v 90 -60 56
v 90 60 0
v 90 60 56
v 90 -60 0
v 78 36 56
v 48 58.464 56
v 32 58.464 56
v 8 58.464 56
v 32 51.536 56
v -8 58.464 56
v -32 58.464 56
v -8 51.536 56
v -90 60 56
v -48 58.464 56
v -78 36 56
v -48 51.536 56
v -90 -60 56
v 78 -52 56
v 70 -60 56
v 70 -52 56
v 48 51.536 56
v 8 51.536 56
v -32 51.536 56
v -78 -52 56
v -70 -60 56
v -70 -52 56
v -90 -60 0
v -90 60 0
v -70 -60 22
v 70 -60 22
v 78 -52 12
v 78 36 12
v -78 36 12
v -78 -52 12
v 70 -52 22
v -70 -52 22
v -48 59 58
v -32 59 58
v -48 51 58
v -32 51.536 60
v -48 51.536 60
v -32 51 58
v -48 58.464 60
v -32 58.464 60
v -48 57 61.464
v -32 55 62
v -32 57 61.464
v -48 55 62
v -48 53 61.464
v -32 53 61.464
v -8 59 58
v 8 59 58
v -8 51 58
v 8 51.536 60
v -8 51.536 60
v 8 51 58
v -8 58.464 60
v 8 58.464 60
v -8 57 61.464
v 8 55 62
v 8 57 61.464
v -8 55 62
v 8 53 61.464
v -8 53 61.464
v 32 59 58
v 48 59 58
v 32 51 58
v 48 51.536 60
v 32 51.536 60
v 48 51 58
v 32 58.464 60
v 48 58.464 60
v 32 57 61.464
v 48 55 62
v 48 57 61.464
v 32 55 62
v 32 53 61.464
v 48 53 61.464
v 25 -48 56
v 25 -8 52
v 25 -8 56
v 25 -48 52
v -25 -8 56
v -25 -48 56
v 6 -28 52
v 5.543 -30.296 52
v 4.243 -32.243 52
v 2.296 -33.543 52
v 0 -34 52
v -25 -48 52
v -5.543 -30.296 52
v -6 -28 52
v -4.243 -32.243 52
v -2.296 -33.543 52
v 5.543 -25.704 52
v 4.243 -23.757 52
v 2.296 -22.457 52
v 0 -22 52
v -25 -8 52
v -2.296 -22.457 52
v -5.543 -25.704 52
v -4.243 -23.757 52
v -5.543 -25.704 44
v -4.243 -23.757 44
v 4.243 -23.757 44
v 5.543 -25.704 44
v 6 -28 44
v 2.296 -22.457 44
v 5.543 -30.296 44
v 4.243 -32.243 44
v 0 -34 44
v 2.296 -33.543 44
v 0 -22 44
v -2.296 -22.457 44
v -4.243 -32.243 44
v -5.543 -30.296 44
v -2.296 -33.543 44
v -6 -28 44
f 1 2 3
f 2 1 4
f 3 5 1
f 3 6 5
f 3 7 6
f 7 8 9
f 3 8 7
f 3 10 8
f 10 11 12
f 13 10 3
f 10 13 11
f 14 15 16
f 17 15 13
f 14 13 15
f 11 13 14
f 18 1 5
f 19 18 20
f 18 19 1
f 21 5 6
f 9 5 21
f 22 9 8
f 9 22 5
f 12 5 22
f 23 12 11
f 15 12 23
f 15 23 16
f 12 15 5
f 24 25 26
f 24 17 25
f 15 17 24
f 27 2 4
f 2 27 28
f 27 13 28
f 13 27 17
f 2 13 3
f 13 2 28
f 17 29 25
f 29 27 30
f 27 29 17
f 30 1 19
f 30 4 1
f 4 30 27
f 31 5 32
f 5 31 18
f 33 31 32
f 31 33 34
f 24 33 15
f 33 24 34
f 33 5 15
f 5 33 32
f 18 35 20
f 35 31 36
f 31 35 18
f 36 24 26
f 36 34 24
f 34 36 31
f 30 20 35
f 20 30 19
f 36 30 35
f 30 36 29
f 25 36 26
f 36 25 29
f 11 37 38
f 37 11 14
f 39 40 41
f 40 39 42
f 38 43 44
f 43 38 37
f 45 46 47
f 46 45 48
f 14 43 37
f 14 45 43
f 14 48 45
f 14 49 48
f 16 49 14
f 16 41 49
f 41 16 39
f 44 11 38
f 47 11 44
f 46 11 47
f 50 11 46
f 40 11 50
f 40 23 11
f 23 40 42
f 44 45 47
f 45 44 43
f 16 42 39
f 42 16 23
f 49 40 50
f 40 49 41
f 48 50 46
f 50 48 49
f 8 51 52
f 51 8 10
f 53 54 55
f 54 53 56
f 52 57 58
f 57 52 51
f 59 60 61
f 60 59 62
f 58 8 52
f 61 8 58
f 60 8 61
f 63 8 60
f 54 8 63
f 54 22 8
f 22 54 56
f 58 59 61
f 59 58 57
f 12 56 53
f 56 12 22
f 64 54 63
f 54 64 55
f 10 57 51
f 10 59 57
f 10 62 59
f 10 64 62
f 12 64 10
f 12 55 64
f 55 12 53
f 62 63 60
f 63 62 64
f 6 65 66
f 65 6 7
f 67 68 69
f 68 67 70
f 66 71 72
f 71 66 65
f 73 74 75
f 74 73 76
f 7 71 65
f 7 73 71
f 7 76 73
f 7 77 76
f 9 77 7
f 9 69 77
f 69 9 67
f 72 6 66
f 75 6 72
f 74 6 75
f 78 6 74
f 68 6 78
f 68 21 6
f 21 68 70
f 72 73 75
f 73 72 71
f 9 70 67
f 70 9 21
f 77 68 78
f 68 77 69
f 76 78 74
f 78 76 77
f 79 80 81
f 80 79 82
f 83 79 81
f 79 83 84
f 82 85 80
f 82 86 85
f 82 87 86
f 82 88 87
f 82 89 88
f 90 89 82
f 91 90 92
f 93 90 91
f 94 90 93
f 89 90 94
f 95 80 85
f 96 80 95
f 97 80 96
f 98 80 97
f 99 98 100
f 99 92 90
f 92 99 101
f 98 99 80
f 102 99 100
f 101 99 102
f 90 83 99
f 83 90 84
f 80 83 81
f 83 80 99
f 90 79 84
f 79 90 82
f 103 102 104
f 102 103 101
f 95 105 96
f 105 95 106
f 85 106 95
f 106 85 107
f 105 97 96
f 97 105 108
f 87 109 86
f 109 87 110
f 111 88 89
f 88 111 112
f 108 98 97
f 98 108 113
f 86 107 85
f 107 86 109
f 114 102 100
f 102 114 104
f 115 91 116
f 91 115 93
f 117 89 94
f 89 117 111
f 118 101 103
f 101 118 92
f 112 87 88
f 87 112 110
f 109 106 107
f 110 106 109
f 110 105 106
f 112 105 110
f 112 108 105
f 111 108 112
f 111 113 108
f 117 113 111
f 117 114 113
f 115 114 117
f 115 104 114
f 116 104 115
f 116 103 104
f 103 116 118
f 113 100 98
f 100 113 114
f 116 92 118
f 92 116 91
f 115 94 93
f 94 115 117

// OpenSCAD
// Articulated cylinder music box — rotatable SCAD mechanical diagram.
// Compile one joint mesh with: openscad -D 'part="cylinder"' -o cylinder.stl musicbox.scad
part = "shell";

module box(sx, sy, sz) { cube([sx, sy, sz], center = true); }
module cyl(h, r, r2 = undef, fn = 28) {
    cylinder(h = h, r1 = r, r2 = (r2 == undef ? r : r2), center = true, $fn = fn);
}

module shell_geom() {
    // Ornate wooden shell with cutaway front so the mechanism stays readable.
    difference() {
        translate([0, 0, 28]) box(180, 120, 56);
        translate([0, -8, 36]) box(156, 88, 48);
        translate([0, -62, 40]) box(140, 20, 36); // front window
    }
    // Feet.
    for (x = [-70, 70]) for (y = [-42, 42])
        translate([x, y, 4]) cyl(8, 8, fn = 16);
    // Inner shelf for the dancer platform.
    translate([0, -28, 54]) box(50, 40, 4);
    translate([0, -28, 48]) cyl(8, 6, fn = 16);
    // Hinge knuckles on the back wall.
    for (x = [-40, 0, 40]) translate([x, 55, 58]) rotate([0, 90, 0]) cyl(16, 4, fn = 12);
}

module lid_geom() {
    // Local origin = hinge axis. Lid body opens toward +Z / -Y when rotated.
    translate([0, -55, 6]) box(176, 112, 8);
    // Beveled glass well (opaque panel stand-in).
    translate([0, -55, 2]) box(140, 80, 4);
    // Front lip.
    translate([0, -108, 10]) box(160, 8, 12);
    // Hinge barrels.
    for (x = [-40, 0, 40]) rotate([0, 90, 0]) translate([0, 0, x]) cyl(14, 5, fn = 14);
}

module bed_geom() {
    // Brass bedplate with axle supports.
    translate([0, 0, 2]) box(150, 90, 4);
    // Cylinder axle stands.
    translate([-55, -6, 18]) box(10, 18, 32);
    translate([70, -6, 18]) box(10, 18, 32);
    translate([-55, -6, 28]) rotate([0, 90, 0]) cyl(8, 5, fn = 14);
    translate([70, -6, 28]) rotate([0, 90, 0]) cyl(8, 5, fn = 14);
    // Comb mount rail.
    translate([8, 22, 8]) box(110, 14, 10);
    // Barrel well.
    translate([-58, 8, 8]) cyl(8, 22, fn = 28);
    // Governor tower.
    translate([62, 10, 14]) cyl(20, 6, fn = 16);
}

module barrel_geom() {
    // Mainspring barrel + winding arbor.
    cyl(16, 20, fn = 36);
    translate([0, 0, 12]) cyl(6, 22, fn = 36);
    translate([0, 0, -12]) cyl(6, 22, fn = 36);
    for (a = [0:30:330]) rotate([0, 0, a]) translate([18, 0, 0]) box(6, 3, 14);
    translate([0, 0, 18]) cyl(12, 4, fn = 12);
    translate([0, 0, 26]) box(18, 4, 4); // winding key stub
}

module cylinder_geom() {
    // Local origin = drum axle. Drum + end flanges + tune pins.
    rotate([0, 90, 0]) cyl(100, 22, fn = 40);
    translate([-52, 0, 0]) rotate([0, 90, 0]) cyl(6, 26, fn = 32);
    translate([52, 0, 0]) rotate([0, 90, 0]) cyl(6, 26, fn = 32);
    // Drive gear at +X end.
    translate([58, 0, 0]) rotate([0, 90, 0]) {
        cyl(8, 16, fn = 28);
        for (a = [0:15:345]) rotate([a, 0, 0]) translate([0, 0, 14]) box(4, 3, 6);
    }
    // Pin schedule (one chorus).
    rotate([0.0, 0, 0]) translate([-42.0, 0, 24]) box(3.2, 3.2, 10);
    rotate([15.0, 0, 0]) translate([-42.0, 0, 24]) box(3.2, 3.2, 10);
    rotate([30.0, 0, 0]) translate([6.0, 0, 24]) box(3.2, 3.2, 10);
    rotate([45.0, 0, 0]) translate([6.0, 0, 24]) box(3.2, 3.2, 10);
    rotate([60.0, 0, 0]) translate([18.0, 0, 24]) box(3.2, 3.2, 10);
    rotate([75.0, 0, 0]) translate([18.0, 0, 24]) box(3.2, 3.2, 10);
    rotate([90.0, 0, 0]) translate([6.0, 0, 24]) box(3.2, 3.2, 10);
    rotate([120.0, 0, 0]) translate([-6.0, 0, 24]) box(3.2, 3.2, 10);
    rotate([135.0, 0, 0]) translate([-6.0, 0, 24]) box(3.2, 3.2, 10);
    rotate([150.0, 0, 0]) translate([-18.0, 0, 24]) box(3.2, 3.2, 10);
    rotate([165.0, 0, 0]) translate([-18.0, 0, 24]) box(3.2, 3.2, 10);
    rotate([180.0, 0, 0]) translate([-30.0, 0, 24]) box(3.2, 3.2, 10);
    rotate([195.0, 0, 0]) translate([-30.0, 0, 24]) box(3.2, 3.2, 10);
    rotate([210.0, 0, 0]) translate([-42.0, 0, 24]) box(3.2, 3.2, 10);
    rotate([240.0, 0, 0]) translate([6.0, 0, 24]) box(3.2, 3.2, 10);
    rotate([255.0, 0, 0]) translate([6.0, 0, 24]) box(3.2, 3.2, 10);
    rotate([270.0, 0, 0]) translate([-6.0, 0, 24]) box(3.2, 3.2, 10);
    rotate([285.0, 0, 0]) translate([-6.0, 0, 24]) box(3.2, 3.2, 10);
    rotate([300.0, 0, 0]) translate([-18.0, 0, 24]) box(3.2, 3.2, 10);
    rotate([315.0, 0, 0]) translate([-18.0, 0, 24]) box(3.2, 3.2, 10);
    rotate([330.0, 0, 0]) translate([-30.0, 0, 24]) box(3.2, 3.2, 10);
    rotate([345.0, 0, 0]) translate([-30.0, 0, 24]) box(3.2, 3.2, 10);
}

module comb_geom() {
    // Tuned comb: longer (lower) teeth toward -X.
    translate([0, 0, 2]) box(110, 12, 4);
    for (i = [0:7]) {
        length = 28 + (7 - i) * 4;
        translate([-42 + i * 12, -length * 0.5, 0]) box(8, length, 2.4);
        translate([-42 + i * 12, -length, 0]) box(6, 4, 3);
    }
}

module governor_geom() {
    // Air-brake fan / worm governor.
    cyl(10, 5, fn = 16);
    translate([0, 0, 8]) cyl(4, 7, fn = 16);
    for (a = [0:90:270]) rotate([0, 0, a]) {
        translate([0, 14, 10]) box(3, 22, 1.6);
        translate([0, 24, 10]) box(10, 6, 1.2);
    }
}

module dancer_geom() {
    // Compact ballerina figurine (skirt + torso + arms).
    translate([0, 0, 2]) cyl(4, 10, fn = 24);
    translate([0, 0, 10]) cyl(14, 16, r2 = 4, fn = 28); // skirt
    translate([0, 0, 22]) cyl(12, 4, fn = 16);
    translate([0, 0, 30]) cyl(8, 5, fn = 16); // head
    translate([-10, 0, 24]) rotate([0, 55, 0]) box(16, 3, 3);
    translate([10, 0, 24]) rotate([0, -55, 0]) box(16, 3, 3);
}

if (part == "shell") shell_geom();
if (part == "lid") lid_geom();
if (part == "bed") bed_geom();
if (part == "barrel") barrel_geom();
if (part == "cylinder") cylinder_geom();
if (part == "comb") comb_geom();
if (part == "governor") governor_geom();
if (part == "dancer") dancer_geom();
